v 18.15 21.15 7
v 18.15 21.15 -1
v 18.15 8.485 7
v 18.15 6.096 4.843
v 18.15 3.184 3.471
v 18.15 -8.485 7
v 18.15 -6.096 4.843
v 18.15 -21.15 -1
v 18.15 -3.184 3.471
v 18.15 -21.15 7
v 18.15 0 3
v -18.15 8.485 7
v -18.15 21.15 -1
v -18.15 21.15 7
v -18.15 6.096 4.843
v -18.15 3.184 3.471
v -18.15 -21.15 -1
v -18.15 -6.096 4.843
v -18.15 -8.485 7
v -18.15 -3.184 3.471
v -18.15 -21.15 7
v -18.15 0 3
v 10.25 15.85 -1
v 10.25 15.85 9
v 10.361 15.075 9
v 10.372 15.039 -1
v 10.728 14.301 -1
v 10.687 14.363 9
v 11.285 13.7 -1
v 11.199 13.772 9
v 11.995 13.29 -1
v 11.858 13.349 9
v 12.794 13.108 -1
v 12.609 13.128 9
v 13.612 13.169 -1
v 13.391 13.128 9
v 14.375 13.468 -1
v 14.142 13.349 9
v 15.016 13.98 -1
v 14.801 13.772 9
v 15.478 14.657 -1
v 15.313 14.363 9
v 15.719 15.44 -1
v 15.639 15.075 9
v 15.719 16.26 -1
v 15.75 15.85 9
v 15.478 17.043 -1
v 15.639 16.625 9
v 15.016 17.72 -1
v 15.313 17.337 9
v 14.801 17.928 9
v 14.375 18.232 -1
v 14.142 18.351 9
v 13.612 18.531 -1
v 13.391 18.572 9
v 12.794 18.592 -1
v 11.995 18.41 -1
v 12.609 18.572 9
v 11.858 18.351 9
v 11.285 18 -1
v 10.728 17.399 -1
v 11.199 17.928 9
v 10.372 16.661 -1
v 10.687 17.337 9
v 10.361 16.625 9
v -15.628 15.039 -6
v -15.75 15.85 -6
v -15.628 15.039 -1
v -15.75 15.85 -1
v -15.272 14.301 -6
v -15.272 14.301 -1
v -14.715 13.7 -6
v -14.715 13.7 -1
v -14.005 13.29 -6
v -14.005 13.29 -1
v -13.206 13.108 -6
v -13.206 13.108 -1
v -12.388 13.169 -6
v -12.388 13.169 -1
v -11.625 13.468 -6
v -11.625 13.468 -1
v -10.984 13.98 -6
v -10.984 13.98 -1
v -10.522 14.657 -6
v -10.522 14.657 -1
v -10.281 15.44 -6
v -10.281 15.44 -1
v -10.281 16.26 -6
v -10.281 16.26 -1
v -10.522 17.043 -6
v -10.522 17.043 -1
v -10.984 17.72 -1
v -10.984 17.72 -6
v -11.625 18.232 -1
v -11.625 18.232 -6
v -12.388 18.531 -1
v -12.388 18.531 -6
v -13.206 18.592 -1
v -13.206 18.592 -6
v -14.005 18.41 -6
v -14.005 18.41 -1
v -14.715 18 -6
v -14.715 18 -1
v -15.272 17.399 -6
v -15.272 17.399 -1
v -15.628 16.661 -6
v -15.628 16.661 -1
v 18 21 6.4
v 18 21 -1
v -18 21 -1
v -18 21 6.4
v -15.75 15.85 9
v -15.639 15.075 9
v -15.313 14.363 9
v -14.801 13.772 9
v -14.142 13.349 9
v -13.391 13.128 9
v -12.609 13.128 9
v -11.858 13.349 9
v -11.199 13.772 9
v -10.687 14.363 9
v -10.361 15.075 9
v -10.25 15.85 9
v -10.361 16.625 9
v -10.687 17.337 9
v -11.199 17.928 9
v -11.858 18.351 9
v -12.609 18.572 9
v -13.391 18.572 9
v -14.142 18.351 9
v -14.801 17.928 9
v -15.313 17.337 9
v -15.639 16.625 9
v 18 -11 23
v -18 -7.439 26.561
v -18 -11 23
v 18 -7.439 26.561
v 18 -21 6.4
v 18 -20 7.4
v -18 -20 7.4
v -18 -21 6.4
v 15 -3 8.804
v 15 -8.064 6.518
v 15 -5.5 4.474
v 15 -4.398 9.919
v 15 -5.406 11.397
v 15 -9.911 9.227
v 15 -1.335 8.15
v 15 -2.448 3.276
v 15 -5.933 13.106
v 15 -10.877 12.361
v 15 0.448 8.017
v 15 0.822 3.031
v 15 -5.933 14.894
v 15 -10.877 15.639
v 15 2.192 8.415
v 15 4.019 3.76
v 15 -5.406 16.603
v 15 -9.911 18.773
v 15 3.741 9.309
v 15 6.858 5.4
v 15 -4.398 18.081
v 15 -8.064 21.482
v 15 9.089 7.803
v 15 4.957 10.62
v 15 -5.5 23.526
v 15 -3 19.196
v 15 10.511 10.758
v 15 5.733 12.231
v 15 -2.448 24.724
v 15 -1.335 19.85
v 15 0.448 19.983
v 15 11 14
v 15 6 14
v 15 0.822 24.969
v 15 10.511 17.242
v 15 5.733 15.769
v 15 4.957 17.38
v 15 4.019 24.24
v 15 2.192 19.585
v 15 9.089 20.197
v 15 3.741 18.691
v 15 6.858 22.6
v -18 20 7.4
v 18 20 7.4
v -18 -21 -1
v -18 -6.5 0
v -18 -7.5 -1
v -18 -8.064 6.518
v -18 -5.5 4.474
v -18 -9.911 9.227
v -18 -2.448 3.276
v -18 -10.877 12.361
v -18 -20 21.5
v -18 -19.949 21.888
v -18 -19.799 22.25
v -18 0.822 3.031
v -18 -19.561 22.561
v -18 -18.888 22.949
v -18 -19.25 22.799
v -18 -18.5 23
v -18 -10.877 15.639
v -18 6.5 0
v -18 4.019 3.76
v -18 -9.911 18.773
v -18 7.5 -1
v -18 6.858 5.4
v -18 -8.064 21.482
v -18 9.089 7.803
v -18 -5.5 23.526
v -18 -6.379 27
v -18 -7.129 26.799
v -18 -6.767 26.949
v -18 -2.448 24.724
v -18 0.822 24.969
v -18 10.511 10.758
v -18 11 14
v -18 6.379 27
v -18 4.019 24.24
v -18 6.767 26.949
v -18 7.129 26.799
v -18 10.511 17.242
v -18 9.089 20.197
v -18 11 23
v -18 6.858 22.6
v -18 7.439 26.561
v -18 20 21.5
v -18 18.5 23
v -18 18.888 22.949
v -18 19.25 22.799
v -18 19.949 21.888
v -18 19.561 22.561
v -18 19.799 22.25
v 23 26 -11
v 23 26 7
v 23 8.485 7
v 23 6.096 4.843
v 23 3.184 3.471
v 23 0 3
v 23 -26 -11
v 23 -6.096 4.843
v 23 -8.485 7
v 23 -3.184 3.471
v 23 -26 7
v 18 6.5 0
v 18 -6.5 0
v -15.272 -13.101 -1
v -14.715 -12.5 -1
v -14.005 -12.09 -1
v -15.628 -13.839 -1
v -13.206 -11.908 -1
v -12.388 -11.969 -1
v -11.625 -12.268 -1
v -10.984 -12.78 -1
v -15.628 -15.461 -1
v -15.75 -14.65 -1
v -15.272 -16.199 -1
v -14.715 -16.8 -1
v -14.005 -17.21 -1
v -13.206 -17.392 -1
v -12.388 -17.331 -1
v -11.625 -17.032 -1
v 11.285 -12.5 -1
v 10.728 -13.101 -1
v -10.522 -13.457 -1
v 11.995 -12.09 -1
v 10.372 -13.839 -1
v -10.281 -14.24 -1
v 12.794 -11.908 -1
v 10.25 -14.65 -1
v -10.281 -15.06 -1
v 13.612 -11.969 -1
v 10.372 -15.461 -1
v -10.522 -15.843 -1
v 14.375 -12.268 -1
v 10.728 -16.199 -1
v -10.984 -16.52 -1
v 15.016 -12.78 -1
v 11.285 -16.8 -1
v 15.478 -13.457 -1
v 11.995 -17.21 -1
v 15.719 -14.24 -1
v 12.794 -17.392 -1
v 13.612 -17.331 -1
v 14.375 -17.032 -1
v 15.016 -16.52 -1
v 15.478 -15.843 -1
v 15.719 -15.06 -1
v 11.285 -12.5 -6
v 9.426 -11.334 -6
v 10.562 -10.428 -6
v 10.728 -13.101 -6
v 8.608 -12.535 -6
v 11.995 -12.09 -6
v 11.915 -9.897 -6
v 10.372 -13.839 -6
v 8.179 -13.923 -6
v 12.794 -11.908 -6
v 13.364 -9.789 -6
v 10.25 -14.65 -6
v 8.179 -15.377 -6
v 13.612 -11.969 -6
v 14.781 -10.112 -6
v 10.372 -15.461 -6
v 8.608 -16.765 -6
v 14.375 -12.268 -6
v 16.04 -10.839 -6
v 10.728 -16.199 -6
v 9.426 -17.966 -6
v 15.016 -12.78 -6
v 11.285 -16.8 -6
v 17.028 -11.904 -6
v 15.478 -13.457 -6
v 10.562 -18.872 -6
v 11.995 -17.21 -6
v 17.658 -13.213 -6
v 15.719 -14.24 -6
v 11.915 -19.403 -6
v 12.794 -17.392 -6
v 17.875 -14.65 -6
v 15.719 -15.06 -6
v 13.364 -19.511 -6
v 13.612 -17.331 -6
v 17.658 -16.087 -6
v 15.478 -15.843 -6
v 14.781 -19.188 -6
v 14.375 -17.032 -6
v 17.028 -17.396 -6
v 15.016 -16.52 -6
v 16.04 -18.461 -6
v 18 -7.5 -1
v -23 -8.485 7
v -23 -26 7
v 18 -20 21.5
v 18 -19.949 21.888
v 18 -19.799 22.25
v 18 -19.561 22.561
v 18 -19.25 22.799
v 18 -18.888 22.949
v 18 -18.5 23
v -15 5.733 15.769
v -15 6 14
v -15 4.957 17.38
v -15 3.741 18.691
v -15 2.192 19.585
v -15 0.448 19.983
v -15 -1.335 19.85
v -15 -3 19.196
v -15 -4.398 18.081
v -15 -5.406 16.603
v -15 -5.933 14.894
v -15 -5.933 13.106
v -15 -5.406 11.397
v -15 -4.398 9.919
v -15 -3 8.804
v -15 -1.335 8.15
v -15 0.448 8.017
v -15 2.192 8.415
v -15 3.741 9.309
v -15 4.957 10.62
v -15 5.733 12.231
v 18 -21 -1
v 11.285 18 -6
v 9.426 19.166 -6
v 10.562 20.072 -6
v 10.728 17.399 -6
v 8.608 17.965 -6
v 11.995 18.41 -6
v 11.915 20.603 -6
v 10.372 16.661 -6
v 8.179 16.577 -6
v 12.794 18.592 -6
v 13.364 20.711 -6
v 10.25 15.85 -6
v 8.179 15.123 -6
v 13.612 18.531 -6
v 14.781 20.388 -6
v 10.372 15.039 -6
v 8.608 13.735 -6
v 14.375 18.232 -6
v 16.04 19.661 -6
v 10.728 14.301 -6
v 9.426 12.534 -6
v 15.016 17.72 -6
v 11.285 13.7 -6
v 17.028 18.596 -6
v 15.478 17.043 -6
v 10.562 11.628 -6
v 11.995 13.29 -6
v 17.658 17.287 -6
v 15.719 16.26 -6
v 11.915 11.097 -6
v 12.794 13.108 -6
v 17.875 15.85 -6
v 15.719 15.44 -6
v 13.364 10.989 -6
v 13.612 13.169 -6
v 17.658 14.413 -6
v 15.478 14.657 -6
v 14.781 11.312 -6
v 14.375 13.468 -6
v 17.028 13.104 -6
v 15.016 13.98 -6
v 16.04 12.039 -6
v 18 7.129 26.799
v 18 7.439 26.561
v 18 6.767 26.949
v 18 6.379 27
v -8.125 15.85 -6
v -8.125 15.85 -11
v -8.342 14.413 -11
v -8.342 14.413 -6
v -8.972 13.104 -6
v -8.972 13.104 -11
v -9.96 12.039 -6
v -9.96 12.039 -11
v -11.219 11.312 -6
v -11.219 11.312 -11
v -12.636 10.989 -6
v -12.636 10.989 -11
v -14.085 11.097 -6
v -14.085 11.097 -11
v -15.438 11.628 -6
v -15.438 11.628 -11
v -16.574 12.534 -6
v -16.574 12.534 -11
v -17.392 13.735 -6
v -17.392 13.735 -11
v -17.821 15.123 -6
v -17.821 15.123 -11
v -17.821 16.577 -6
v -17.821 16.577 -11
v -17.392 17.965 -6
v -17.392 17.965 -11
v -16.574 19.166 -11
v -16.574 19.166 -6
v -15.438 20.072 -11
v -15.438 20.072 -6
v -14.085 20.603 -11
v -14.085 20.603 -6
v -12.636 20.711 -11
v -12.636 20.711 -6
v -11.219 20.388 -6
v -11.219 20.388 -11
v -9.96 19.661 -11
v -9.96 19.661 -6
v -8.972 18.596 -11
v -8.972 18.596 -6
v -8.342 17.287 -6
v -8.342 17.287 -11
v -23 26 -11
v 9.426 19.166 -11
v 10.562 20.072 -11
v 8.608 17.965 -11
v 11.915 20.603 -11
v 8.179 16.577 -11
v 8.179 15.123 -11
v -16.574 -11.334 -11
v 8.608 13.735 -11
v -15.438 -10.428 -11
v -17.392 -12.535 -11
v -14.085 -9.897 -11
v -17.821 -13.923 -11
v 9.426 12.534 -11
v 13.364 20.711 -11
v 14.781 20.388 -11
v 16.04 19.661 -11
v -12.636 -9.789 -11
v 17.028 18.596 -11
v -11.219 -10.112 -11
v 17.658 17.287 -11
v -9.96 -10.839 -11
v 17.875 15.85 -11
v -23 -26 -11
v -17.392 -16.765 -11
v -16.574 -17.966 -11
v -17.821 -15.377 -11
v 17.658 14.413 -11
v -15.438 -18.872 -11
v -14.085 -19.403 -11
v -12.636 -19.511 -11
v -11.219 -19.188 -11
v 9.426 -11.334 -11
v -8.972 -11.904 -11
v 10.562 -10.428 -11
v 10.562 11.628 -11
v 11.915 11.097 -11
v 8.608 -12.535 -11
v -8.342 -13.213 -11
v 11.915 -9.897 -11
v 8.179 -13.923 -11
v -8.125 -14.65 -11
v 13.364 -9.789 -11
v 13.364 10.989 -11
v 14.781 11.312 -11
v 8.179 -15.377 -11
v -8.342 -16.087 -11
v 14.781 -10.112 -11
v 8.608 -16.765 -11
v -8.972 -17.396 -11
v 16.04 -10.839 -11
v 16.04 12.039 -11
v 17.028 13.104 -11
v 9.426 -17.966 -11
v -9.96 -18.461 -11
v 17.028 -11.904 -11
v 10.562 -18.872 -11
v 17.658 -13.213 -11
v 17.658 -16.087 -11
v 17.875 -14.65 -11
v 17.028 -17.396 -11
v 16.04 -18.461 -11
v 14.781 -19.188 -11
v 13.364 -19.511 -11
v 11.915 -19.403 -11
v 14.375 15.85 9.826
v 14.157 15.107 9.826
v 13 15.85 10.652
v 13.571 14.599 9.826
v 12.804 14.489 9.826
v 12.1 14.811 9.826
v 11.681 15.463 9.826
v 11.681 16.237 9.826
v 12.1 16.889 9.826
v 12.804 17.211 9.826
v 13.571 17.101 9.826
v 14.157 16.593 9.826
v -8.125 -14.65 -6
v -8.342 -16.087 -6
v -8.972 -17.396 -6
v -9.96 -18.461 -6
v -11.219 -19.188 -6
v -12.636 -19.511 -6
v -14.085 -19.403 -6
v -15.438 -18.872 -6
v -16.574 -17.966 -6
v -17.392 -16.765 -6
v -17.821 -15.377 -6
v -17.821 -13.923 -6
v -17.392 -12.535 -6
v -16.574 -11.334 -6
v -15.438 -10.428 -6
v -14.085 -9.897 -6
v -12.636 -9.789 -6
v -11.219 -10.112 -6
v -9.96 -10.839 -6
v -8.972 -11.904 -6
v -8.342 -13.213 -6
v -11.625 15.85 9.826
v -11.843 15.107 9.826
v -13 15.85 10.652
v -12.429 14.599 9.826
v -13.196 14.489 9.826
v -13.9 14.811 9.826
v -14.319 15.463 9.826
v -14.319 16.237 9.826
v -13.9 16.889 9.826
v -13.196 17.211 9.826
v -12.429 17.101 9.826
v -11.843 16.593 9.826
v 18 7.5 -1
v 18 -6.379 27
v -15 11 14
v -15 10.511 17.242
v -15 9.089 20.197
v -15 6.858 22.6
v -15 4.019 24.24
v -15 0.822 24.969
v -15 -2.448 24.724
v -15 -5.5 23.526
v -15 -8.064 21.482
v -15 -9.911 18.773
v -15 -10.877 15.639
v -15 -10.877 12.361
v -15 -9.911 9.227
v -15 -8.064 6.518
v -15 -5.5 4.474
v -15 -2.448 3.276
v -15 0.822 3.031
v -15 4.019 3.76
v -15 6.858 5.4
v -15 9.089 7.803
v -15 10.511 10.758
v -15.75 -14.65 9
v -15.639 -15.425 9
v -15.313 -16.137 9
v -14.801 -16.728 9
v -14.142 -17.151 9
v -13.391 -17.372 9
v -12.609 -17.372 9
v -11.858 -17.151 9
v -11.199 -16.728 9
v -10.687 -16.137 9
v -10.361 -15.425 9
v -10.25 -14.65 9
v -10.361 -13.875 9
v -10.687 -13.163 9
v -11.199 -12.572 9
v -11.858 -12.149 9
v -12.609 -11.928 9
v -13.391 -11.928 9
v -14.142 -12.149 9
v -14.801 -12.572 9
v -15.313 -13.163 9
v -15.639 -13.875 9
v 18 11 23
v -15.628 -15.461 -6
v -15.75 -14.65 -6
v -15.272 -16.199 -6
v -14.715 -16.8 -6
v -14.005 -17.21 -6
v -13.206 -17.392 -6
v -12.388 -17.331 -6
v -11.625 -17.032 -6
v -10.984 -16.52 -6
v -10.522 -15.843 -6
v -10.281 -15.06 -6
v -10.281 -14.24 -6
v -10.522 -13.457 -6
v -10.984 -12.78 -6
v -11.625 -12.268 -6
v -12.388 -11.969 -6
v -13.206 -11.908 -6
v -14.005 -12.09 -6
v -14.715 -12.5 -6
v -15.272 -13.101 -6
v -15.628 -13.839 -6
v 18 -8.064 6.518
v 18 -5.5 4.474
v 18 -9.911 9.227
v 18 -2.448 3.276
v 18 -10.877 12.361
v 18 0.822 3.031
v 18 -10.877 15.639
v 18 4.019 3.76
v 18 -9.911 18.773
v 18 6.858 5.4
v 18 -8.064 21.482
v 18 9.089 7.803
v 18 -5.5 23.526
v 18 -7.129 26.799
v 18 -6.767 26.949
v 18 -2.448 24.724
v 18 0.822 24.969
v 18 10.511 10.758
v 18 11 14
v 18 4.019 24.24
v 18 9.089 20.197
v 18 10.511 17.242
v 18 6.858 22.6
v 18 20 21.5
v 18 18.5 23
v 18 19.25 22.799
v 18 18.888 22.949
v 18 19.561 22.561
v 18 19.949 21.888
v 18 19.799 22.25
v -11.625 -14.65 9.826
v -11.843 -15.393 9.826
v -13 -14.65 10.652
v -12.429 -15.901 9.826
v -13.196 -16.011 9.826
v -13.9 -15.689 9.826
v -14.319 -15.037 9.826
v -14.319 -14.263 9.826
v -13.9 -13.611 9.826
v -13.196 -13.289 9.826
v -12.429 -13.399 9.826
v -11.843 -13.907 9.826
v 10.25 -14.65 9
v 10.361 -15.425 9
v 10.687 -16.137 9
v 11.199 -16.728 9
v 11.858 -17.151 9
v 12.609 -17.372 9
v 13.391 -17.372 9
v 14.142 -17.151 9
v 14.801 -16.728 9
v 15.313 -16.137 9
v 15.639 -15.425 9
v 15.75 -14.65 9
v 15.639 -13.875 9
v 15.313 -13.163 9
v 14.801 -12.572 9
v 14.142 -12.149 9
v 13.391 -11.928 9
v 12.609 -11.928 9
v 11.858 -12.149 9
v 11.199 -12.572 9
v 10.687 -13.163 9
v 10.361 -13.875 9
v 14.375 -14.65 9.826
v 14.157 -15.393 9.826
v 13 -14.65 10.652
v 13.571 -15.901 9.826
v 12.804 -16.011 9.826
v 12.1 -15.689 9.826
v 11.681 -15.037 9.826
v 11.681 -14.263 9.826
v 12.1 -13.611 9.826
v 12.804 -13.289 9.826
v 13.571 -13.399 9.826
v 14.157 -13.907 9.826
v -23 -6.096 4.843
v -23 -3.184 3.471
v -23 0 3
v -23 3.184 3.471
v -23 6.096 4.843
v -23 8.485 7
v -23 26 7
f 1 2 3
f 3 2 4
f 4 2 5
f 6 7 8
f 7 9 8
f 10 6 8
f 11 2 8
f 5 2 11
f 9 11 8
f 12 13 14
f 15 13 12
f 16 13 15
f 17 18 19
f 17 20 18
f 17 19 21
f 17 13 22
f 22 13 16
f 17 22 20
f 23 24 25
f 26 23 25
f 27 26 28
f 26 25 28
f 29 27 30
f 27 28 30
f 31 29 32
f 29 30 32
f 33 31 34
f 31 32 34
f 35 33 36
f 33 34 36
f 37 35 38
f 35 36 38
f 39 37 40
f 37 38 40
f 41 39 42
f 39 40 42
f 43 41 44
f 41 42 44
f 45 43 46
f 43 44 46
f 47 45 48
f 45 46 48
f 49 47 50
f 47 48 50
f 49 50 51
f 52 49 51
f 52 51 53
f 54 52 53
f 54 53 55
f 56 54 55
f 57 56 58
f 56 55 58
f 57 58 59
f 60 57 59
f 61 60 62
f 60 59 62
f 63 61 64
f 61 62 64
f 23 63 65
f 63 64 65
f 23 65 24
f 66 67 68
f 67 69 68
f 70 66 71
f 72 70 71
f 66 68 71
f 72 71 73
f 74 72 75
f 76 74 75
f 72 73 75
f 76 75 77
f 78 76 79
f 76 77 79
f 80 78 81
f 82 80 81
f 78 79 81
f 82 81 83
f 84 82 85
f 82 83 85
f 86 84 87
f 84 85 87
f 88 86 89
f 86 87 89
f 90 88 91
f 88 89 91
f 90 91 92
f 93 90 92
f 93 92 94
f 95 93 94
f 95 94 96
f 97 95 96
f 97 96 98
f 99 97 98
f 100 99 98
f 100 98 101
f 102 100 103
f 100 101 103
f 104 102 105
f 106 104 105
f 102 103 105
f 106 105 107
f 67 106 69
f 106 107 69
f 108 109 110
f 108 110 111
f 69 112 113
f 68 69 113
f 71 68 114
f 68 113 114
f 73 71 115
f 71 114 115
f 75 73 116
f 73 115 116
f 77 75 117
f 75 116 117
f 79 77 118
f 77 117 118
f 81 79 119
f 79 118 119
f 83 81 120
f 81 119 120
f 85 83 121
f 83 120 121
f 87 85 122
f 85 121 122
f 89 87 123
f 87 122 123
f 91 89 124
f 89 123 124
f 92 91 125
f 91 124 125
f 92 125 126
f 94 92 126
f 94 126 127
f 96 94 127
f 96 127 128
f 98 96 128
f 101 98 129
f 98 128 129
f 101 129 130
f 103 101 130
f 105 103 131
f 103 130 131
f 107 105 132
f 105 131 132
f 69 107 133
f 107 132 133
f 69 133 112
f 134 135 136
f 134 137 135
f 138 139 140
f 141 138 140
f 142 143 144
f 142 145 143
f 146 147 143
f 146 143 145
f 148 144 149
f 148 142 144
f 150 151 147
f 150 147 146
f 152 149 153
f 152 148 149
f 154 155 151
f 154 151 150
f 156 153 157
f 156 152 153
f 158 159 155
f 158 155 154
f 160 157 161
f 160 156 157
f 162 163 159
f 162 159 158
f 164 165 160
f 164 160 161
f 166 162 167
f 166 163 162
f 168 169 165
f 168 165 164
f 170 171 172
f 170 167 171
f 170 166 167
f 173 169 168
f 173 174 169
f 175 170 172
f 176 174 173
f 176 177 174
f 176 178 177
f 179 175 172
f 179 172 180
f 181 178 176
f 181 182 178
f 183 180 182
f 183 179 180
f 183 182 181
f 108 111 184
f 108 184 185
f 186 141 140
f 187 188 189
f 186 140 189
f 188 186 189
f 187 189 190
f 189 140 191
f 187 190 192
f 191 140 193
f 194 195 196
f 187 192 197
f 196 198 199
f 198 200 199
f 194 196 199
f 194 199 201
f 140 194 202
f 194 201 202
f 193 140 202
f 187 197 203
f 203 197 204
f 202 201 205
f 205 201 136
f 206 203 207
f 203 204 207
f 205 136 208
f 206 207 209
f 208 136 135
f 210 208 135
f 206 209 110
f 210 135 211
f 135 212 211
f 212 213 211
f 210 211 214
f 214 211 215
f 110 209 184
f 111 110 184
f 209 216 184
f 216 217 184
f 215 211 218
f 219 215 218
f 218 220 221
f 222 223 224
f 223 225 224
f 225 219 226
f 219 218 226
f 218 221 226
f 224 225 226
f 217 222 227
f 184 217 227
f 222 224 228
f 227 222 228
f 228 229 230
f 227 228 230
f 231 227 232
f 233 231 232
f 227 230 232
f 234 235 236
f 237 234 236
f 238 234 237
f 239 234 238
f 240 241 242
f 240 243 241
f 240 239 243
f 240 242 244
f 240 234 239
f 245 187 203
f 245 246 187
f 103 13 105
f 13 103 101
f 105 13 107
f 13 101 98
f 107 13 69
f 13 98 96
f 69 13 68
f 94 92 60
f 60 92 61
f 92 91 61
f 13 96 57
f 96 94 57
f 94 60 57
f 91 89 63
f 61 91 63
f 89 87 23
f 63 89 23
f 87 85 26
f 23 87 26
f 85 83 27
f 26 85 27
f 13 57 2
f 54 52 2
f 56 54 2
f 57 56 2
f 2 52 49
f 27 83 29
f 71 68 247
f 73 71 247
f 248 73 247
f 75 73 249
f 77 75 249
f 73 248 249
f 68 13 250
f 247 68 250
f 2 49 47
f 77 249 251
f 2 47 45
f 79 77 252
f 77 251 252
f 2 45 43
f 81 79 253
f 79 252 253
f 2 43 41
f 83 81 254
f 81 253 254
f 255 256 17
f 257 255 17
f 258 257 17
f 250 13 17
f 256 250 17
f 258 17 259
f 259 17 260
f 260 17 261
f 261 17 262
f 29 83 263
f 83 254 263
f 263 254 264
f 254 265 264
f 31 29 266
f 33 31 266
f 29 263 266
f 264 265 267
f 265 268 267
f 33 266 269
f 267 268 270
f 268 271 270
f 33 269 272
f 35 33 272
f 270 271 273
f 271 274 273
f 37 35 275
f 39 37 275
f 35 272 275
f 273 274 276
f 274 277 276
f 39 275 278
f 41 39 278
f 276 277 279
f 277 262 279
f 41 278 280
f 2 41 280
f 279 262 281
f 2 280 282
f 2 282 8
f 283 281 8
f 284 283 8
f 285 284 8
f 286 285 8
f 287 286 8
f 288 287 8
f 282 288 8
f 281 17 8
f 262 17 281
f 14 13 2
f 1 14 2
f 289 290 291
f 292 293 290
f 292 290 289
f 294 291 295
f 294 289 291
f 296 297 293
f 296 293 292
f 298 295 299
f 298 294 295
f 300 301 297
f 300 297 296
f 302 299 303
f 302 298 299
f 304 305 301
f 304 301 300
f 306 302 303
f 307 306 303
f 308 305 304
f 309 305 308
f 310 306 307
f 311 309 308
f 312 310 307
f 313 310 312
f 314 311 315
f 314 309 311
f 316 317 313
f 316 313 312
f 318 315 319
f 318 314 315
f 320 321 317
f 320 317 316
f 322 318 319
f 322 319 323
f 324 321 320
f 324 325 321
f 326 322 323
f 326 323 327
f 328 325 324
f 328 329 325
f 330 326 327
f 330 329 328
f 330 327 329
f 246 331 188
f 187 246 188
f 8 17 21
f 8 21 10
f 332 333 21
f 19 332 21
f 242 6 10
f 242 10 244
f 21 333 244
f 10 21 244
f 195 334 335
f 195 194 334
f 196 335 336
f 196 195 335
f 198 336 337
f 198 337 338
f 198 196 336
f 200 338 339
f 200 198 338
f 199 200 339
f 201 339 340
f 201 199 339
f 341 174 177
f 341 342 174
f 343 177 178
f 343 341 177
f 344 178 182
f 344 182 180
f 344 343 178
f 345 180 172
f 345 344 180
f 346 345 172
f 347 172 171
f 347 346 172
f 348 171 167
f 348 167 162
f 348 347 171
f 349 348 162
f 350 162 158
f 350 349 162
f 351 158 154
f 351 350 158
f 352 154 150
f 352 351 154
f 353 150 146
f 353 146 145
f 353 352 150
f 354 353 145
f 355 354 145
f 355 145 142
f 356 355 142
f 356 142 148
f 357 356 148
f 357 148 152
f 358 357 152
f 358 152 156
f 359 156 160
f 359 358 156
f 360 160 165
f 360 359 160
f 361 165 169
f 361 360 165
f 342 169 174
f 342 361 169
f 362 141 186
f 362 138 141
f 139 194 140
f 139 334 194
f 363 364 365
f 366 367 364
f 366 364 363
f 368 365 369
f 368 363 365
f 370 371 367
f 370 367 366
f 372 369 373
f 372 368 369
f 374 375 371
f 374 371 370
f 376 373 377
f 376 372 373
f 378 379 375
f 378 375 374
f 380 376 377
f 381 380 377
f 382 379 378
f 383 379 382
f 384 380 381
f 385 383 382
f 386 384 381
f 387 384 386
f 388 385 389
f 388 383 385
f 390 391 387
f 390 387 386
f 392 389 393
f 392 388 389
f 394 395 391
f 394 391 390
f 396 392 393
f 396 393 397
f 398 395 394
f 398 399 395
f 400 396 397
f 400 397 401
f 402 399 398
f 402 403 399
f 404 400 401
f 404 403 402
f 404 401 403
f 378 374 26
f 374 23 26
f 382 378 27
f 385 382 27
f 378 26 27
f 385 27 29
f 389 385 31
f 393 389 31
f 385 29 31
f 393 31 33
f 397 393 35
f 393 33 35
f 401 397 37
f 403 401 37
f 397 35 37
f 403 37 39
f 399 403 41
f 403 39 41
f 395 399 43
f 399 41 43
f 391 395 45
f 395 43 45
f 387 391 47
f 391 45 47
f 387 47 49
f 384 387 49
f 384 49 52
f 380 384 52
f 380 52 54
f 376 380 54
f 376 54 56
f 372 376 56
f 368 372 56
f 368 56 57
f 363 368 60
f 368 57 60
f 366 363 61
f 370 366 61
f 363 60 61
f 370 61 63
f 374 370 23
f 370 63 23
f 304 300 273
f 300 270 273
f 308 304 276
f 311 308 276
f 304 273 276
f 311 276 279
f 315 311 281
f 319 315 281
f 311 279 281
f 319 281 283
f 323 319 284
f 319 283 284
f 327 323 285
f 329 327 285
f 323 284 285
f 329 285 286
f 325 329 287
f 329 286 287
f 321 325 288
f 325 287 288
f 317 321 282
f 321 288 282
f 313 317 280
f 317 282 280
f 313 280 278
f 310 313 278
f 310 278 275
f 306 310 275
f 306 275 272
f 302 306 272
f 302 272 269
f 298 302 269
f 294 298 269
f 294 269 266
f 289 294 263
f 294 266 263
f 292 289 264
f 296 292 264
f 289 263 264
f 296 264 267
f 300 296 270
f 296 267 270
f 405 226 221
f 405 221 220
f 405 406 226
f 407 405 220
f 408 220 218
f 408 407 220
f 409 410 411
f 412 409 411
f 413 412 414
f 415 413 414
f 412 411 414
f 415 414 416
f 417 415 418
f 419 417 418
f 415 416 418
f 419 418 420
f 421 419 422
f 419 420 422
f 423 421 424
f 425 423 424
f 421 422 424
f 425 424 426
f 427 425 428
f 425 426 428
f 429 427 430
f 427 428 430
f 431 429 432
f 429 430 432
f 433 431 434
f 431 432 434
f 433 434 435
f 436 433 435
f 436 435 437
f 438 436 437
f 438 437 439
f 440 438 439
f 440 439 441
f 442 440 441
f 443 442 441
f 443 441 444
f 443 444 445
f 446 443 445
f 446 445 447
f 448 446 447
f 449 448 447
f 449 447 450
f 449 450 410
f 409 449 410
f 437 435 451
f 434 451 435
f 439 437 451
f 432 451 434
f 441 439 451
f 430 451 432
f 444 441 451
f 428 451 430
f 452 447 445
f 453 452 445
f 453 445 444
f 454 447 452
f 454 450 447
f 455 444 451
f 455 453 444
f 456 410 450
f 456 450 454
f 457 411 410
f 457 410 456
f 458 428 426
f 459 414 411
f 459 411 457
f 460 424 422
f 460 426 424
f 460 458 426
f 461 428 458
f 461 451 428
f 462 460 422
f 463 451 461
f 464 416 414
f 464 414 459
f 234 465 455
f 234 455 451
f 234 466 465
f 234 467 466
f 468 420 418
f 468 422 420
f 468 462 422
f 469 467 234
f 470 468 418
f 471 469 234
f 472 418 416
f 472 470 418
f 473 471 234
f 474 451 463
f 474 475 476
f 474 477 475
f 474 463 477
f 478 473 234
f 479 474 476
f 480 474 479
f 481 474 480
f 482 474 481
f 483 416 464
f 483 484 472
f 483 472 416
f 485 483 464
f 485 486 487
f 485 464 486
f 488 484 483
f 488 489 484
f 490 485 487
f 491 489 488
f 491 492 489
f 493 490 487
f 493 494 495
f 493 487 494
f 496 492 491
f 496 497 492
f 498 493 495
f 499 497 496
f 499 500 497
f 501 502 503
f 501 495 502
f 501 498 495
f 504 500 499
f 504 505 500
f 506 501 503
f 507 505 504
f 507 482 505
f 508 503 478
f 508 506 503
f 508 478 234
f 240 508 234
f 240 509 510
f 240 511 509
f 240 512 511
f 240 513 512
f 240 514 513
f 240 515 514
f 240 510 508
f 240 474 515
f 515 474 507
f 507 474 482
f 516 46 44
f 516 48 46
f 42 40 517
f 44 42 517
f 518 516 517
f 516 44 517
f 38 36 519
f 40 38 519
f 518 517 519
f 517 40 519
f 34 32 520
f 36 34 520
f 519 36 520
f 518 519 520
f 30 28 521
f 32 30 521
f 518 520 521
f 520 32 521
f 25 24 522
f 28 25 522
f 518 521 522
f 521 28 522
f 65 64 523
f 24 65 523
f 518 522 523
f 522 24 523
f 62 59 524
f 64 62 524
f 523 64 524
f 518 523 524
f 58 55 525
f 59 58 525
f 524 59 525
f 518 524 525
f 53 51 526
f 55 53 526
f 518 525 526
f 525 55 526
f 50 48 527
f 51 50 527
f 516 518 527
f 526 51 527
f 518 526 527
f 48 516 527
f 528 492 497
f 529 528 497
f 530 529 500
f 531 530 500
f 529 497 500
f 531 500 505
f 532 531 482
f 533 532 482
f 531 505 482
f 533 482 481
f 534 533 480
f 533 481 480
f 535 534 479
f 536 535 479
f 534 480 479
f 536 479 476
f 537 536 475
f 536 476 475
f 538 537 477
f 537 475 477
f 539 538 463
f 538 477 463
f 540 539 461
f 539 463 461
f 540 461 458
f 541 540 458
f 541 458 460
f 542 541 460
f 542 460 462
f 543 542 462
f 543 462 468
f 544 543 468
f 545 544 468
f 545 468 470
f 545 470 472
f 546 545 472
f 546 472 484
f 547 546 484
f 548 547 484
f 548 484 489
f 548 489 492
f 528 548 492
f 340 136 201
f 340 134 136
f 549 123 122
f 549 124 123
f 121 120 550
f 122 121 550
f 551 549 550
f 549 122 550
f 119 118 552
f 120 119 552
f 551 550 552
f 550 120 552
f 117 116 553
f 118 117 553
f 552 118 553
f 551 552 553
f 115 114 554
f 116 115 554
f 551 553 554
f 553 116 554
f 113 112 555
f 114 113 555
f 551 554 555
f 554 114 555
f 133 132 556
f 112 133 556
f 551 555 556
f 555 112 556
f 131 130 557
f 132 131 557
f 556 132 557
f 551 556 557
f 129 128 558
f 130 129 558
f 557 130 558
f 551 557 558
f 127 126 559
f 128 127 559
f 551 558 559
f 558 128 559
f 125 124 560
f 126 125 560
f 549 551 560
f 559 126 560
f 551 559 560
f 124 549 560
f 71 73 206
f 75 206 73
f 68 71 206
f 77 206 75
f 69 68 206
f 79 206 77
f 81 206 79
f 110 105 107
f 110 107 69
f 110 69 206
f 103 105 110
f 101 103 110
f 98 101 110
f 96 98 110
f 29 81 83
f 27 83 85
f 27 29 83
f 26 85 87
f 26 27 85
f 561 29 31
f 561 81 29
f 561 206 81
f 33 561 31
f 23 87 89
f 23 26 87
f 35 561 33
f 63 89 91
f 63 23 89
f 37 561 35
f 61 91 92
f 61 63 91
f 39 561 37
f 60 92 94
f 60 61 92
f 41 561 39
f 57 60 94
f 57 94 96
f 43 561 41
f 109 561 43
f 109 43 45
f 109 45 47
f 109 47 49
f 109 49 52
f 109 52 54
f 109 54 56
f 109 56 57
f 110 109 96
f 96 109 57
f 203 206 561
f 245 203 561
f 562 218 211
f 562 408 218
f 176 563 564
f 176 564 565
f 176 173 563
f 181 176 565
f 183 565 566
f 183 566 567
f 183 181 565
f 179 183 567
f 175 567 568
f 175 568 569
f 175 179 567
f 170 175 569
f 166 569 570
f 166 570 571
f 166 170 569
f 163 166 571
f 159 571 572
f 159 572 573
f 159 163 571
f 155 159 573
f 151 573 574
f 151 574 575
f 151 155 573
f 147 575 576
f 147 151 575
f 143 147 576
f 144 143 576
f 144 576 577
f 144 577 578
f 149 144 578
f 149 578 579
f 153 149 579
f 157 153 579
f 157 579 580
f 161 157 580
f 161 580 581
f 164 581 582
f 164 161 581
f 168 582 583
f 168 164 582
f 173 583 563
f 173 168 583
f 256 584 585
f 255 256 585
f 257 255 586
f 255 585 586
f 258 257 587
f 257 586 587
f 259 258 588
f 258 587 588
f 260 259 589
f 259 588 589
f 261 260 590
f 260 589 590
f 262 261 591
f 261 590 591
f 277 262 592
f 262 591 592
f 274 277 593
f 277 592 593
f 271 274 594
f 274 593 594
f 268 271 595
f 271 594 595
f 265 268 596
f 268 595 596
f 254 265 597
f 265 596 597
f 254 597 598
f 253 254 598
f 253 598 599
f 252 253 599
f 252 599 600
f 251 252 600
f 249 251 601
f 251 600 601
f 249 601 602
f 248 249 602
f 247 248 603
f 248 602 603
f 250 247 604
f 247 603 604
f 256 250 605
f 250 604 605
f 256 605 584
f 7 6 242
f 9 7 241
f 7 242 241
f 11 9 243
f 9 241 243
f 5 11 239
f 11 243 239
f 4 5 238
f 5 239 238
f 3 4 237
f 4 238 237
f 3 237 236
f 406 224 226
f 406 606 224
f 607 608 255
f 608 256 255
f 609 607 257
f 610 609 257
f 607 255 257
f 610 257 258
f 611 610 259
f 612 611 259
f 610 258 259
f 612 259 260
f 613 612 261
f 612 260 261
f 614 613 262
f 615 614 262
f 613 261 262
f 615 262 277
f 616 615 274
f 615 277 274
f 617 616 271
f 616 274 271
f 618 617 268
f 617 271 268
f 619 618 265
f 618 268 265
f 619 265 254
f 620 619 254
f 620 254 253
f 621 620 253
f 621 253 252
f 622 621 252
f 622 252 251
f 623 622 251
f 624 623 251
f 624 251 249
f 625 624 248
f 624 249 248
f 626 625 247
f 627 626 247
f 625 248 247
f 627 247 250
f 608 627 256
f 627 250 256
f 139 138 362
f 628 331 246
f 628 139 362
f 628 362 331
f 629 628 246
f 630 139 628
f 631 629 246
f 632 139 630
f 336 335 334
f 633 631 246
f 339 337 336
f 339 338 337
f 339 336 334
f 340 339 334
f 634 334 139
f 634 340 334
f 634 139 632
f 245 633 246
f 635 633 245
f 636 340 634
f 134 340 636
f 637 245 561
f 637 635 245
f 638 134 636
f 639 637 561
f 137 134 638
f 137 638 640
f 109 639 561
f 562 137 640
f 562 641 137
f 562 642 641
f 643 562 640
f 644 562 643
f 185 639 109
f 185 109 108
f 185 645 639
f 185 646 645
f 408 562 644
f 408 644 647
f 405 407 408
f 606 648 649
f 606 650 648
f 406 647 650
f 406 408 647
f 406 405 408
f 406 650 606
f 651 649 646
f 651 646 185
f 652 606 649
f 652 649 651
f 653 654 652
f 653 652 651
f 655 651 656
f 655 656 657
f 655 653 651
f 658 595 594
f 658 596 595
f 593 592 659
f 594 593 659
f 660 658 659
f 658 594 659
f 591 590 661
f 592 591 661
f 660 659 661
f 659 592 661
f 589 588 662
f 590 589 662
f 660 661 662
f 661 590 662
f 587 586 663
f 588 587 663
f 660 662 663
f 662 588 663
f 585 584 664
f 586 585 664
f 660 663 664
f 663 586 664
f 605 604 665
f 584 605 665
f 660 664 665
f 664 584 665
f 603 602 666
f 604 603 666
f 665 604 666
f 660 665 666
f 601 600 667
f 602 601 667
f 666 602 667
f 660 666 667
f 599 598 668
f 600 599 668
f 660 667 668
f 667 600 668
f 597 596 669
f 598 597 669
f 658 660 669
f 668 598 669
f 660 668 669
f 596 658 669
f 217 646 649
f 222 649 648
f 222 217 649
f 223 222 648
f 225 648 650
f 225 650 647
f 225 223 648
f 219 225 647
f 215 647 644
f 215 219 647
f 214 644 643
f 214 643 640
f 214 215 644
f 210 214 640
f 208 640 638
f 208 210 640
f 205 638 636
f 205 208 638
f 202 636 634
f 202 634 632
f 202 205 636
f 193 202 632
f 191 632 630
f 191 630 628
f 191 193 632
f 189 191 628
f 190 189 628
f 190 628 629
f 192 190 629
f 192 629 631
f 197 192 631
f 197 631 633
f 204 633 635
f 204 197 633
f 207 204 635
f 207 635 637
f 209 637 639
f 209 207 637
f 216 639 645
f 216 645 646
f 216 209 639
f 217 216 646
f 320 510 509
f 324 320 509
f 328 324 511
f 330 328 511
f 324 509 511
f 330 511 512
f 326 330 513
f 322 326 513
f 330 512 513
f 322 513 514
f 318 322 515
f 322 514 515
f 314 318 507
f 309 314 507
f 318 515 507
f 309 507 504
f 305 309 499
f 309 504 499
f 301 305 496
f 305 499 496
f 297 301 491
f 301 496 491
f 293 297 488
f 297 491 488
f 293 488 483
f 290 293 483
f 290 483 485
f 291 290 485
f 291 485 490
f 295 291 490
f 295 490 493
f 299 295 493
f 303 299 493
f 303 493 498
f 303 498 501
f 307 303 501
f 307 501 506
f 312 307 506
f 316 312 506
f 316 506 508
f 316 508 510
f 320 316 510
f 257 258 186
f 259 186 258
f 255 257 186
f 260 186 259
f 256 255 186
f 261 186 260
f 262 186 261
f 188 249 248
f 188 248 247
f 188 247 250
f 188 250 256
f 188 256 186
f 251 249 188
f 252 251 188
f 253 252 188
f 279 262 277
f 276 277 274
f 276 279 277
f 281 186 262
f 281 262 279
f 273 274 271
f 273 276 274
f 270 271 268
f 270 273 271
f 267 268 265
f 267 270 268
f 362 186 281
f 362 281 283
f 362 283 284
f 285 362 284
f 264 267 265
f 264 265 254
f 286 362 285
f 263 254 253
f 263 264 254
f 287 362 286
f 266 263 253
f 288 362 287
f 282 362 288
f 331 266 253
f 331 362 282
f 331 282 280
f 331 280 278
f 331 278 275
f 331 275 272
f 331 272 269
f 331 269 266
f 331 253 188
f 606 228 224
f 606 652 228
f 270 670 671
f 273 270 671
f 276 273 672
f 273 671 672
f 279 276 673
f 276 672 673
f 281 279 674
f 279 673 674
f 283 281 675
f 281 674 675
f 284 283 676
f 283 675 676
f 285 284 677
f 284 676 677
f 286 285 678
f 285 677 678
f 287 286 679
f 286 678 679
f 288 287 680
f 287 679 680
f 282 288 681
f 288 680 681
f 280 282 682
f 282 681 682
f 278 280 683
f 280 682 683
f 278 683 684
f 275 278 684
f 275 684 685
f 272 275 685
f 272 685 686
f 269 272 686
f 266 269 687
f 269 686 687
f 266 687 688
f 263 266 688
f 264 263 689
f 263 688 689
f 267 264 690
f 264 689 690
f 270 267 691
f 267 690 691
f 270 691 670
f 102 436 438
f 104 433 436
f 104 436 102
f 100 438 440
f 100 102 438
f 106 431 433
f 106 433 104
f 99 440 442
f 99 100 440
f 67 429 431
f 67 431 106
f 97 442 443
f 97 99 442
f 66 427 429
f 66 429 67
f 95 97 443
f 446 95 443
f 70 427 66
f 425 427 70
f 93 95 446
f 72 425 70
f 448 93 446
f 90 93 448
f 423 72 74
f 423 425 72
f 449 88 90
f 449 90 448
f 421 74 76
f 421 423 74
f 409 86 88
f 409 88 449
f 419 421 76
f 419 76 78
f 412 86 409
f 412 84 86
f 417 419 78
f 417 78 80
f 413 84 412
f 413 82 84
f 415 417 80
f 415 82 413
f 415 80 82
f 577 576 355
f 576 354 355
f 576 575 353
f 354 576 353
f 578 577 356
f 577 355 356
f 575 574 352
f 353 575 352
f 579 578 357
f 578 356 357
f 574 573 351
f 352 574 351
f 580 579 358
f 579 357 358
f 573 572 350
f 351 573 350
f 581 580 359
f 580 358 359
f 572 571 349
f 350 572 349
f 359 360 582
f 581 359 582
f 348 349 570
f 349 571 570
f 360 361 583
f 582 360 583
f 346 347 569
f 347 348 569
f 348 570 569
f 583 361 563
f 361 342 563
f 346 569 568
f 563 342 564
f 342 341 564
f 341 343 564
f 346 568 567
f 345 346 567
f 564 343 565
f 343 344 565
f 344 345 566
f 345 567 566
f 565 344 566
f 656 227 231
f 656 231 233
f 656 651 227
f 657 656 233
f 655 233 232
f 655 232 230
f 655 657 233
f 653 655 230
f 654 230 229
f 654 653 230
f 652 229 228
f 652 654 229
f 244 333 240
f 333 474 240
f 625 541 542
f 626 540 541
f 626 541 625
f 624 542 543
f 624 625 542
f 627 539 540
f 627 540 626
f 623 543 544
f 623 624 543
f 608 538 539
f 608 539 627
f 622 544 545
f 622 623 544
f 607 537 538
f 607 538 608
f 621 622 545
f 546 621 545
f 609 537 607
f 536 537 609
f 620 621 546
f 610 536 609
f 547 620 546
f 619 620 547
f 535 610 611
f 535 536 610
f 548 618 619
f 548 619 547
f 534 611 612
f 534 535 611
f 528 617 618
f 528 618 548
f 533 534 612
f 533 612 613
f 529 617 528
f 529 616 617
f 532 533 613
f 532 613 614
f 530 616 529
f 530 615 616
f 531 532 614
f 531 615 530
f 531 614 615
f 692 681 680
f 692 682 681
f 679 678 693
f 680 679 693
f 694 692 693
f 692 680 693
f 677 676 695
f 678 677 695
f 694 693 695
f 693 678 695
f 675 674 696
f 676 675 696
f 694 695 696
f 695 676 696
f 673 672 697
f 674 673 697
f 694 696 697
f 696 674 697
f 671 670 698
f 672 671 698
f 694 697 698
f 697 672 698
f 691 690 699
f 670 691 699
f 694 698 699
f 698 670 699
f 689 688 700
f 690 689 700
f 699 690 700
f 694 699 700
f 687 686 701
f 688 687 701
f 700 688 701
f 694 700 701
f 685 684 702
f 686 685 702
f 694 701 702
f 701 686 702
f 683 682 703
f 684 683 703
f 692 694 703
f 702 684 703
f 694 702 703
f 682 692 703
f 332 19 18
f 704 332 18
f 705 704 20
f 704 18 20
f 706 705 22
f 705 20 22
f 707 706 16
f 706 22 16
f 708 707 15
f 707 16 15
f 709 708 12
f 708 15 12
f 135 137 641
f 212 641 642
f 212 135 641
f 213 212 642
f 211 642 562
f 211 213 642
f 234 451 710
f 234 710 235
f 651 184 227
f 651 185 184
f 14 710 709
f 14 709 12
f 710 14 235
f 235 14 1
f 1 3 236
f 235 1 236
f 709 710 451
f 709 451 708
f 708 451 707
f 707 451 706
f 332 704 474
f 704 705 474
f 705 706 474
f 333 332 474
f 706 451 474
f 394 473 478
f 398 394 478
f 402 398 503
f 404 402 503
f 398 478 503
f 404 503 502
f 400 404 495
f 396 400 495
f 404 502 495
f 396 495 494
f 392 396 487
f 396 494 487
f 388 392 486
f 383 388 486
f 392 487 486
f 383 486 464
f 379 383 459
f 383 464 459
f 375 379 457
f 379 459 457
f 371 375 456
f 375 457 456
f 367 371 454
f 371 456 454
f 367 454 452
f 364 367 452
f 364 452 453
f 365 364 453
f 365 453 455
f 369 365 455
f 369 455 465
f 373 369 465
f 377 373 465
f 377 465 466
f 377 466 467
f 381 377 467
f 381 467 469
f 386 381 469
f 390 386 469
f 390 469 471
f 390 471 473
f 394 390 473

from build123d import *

# Parameters (mm, degrees)
F1_R              = 11
F2_DEPTH          = 18
F1_R_2            = 6
F3_DEPTH          = 15
F4_SIZE           = 0.99999
F5_R              = 1.5
F6_W              = 46
F6_H              = 52
F6_W_2            = 36.3
F6_H_2            = 42.3
F6_W_3            = 26
F6_H_3            = 23.35
F6_H_4            = 7.15
F7_DEPTH          = 10
F8_DEPTH          = 8
F10_D             = 5.5
F10_DEPTH         = 20
F10_CBORE_D       = 9.75
F10_CBORE_DEPTH   = 5
F10_TIP           = 1.6523667023
F10_2_D           = 5.5
F10_2_DEPTH       = 20
F10_2_CBORE_D     = 9.75
F10_2_CBORE_DEPTH = 5
F10_2_TIP         = 1.6523667023
F11_DEPTH         = 57.8


# Not quite as in the source:
# - a fillet or chamfer is up to 0.001 mm smaller than in the source, because OpenCascade refuses the exact size


with BuildPart() as f2:
    # F1 (on Right) → F2 (new body, symmetric)
    with BuildSketch(Plane.YZ):
        Polygon((-7.5, 0), (0, 0), (7.5, 0), (7.5, -1), (21, -1), (21, 6.4), (20, 6.4), (20, 23), (11, 23), (7, 27), (0, 27), (-7, 27), (-11, 23), (-20, 23), (-20, 6.4), (-21, 6.4), (-21, -1), (-7.5, -1), align=None)
        with Locations((0, 14)):
            Circle(F1_R, mode=Mode.SUBTRACT)
    extrude(amount=F2_DEPTH, both=True)

    # F4 (size 1 in the source; OpenCascade refuses exactly that, so slightly less here)
    f4_edges = [f2.edges().sort_by_distance(p)[0] for p in [
        (0, -20, 6.4),
        (0, 20, 6.4),
        (0, -7.5, 0),
        (0, 7.5, 0),
    ]]
    chamfer(f4_edges, length=F4_SIZE)

    # F5
    f5_edges = [f2.edges().sort_by_distance(p)[0] for p in [
        (0, -7, 27),
        (0, 7, 27),
        (0, -20, 23),
        (0, 20, 23),
    ]]
    fillet(f5_edges, radius=F5_R)

    # F10
    with Locations(Plane(origin=(0, 0, -11), x_dir=(1, 0, 0), z_dir=(0, 0, -1))):
        with Locations((-13, -15.85), (13, -15.85), (-13, 14.65), (13, 14.65)):
            CounterBoreHole(F10_D / 2, F10_CBORE_D / 2, F10_CBORE_DEPTH, depth=F10_DEPTH)
            with Locations((0, 0, -(F10_DEPTH + F10_TIP / 2))):  # 118° drill point
                Cone(0, F10_D / 2, F10_TIP, mode=Mode.SUBTRACT)


with BuildPart() as f3:
    # F1 (on Right) → F3 (new body, symmetric)
    with BuildSketch(Plane.YZ):
        with Locations((0, 14)):
            Circle(F1_R)
        with Locations((0, 14)):
            Circle(F1_R_2, mode=Mode.SUBTRACT)
    extrude(amount=F3_DEPTH, both=True)


with BuildPart() as f7:
    # F6 (on face) → F7 (new body)
    with BuildSketch(Plane(origin=(0, 0, -1), x_dir=(1, 0, 0), z_dir=(0, 0, -1))):
        Rectangle(F6_W, F6_H)
        Rectangle(F6_W_2, F6_H_2, mode=Mode.SUBTRACT)
        Rectangle(F6_W_2, F6_H_2)
        Polygon((18, 21), (18, 7.5), (18, -21), (-18, -21), (-18, 7.5), (-18, 21), align=None, mode=Mode.SUBTRACT)
        with Locations((0, -4.175)):
            Rectangle(F6_W_3, F6_H_3)
        Polygon((18, 7.5), (13, 7.5), (13, -15.85), (-13, -15.85), (-13, 7.5), (-18, 7.5), (-18, -21), (18, -21), align=None)
        Polygon((-13, 14.65), (13, 14.65), (13, 7.5), (18, 7.5), (18, 21), (-18, 21), (-18, 7.5), (-13, 7.5), align=None)
        with Locations((0, 11.075)):
            Rectangle(F6_W_3, F6_H_4)
    extrude(amount=F7_DEPTH)

    # F6 (on face) → F8 (join)
    with BuildSketch(Plane(origin=(0, 0, -1), x_dir=(1, 0, 0), z_dir=(0, 0, -1))):
        Rectangle(F6_W, F6_H)
        Rectangle(F6_W_2, F6_H_2, mode=Mode.SUBTRACT)
    extrude(amount=-F8_DEPTH)

    # F10#2
    with Locations(Plane(origin=(0, 0, -11), x_dir=(1, 0, 0), z_dir=(0, 0, -1))):
        with Locations((-13, -15.85), (13, -15.85), (-13, 14.65), (13, 14.65)):
            CounterBoreHole(F10_2_D / 2, F10_2_CBORE_D / 2, F10_2_CBORE_DEPTH, depth=F10_2_DEPTH)
            with Locations((0, 0, -(F10_2_DEPTH + F10_2_TIP / 2))):  # 118° drill point
                Cone(0, F10_2_D / 2, F10_2_TIP, mode=Mode.SUBTRACT)

    # F1 (on Right) → F11 (cut, symmetric)
    with BuildSketch(Plane.YZ):
        with Locations((0, 14)):
            Circle(F1_R)
        with Locations((0, 14)):
            Circle(F1_R_2, mode=Mode.SUBTRACT)
        with Locations((0, 14)):
            Circle(F1_R_2)
    extrude(amount=F11_DEPTH, both=True, mode=Mode.SUBTRACT)


solid = Compound([f2.part, f3.part, f7.part])
